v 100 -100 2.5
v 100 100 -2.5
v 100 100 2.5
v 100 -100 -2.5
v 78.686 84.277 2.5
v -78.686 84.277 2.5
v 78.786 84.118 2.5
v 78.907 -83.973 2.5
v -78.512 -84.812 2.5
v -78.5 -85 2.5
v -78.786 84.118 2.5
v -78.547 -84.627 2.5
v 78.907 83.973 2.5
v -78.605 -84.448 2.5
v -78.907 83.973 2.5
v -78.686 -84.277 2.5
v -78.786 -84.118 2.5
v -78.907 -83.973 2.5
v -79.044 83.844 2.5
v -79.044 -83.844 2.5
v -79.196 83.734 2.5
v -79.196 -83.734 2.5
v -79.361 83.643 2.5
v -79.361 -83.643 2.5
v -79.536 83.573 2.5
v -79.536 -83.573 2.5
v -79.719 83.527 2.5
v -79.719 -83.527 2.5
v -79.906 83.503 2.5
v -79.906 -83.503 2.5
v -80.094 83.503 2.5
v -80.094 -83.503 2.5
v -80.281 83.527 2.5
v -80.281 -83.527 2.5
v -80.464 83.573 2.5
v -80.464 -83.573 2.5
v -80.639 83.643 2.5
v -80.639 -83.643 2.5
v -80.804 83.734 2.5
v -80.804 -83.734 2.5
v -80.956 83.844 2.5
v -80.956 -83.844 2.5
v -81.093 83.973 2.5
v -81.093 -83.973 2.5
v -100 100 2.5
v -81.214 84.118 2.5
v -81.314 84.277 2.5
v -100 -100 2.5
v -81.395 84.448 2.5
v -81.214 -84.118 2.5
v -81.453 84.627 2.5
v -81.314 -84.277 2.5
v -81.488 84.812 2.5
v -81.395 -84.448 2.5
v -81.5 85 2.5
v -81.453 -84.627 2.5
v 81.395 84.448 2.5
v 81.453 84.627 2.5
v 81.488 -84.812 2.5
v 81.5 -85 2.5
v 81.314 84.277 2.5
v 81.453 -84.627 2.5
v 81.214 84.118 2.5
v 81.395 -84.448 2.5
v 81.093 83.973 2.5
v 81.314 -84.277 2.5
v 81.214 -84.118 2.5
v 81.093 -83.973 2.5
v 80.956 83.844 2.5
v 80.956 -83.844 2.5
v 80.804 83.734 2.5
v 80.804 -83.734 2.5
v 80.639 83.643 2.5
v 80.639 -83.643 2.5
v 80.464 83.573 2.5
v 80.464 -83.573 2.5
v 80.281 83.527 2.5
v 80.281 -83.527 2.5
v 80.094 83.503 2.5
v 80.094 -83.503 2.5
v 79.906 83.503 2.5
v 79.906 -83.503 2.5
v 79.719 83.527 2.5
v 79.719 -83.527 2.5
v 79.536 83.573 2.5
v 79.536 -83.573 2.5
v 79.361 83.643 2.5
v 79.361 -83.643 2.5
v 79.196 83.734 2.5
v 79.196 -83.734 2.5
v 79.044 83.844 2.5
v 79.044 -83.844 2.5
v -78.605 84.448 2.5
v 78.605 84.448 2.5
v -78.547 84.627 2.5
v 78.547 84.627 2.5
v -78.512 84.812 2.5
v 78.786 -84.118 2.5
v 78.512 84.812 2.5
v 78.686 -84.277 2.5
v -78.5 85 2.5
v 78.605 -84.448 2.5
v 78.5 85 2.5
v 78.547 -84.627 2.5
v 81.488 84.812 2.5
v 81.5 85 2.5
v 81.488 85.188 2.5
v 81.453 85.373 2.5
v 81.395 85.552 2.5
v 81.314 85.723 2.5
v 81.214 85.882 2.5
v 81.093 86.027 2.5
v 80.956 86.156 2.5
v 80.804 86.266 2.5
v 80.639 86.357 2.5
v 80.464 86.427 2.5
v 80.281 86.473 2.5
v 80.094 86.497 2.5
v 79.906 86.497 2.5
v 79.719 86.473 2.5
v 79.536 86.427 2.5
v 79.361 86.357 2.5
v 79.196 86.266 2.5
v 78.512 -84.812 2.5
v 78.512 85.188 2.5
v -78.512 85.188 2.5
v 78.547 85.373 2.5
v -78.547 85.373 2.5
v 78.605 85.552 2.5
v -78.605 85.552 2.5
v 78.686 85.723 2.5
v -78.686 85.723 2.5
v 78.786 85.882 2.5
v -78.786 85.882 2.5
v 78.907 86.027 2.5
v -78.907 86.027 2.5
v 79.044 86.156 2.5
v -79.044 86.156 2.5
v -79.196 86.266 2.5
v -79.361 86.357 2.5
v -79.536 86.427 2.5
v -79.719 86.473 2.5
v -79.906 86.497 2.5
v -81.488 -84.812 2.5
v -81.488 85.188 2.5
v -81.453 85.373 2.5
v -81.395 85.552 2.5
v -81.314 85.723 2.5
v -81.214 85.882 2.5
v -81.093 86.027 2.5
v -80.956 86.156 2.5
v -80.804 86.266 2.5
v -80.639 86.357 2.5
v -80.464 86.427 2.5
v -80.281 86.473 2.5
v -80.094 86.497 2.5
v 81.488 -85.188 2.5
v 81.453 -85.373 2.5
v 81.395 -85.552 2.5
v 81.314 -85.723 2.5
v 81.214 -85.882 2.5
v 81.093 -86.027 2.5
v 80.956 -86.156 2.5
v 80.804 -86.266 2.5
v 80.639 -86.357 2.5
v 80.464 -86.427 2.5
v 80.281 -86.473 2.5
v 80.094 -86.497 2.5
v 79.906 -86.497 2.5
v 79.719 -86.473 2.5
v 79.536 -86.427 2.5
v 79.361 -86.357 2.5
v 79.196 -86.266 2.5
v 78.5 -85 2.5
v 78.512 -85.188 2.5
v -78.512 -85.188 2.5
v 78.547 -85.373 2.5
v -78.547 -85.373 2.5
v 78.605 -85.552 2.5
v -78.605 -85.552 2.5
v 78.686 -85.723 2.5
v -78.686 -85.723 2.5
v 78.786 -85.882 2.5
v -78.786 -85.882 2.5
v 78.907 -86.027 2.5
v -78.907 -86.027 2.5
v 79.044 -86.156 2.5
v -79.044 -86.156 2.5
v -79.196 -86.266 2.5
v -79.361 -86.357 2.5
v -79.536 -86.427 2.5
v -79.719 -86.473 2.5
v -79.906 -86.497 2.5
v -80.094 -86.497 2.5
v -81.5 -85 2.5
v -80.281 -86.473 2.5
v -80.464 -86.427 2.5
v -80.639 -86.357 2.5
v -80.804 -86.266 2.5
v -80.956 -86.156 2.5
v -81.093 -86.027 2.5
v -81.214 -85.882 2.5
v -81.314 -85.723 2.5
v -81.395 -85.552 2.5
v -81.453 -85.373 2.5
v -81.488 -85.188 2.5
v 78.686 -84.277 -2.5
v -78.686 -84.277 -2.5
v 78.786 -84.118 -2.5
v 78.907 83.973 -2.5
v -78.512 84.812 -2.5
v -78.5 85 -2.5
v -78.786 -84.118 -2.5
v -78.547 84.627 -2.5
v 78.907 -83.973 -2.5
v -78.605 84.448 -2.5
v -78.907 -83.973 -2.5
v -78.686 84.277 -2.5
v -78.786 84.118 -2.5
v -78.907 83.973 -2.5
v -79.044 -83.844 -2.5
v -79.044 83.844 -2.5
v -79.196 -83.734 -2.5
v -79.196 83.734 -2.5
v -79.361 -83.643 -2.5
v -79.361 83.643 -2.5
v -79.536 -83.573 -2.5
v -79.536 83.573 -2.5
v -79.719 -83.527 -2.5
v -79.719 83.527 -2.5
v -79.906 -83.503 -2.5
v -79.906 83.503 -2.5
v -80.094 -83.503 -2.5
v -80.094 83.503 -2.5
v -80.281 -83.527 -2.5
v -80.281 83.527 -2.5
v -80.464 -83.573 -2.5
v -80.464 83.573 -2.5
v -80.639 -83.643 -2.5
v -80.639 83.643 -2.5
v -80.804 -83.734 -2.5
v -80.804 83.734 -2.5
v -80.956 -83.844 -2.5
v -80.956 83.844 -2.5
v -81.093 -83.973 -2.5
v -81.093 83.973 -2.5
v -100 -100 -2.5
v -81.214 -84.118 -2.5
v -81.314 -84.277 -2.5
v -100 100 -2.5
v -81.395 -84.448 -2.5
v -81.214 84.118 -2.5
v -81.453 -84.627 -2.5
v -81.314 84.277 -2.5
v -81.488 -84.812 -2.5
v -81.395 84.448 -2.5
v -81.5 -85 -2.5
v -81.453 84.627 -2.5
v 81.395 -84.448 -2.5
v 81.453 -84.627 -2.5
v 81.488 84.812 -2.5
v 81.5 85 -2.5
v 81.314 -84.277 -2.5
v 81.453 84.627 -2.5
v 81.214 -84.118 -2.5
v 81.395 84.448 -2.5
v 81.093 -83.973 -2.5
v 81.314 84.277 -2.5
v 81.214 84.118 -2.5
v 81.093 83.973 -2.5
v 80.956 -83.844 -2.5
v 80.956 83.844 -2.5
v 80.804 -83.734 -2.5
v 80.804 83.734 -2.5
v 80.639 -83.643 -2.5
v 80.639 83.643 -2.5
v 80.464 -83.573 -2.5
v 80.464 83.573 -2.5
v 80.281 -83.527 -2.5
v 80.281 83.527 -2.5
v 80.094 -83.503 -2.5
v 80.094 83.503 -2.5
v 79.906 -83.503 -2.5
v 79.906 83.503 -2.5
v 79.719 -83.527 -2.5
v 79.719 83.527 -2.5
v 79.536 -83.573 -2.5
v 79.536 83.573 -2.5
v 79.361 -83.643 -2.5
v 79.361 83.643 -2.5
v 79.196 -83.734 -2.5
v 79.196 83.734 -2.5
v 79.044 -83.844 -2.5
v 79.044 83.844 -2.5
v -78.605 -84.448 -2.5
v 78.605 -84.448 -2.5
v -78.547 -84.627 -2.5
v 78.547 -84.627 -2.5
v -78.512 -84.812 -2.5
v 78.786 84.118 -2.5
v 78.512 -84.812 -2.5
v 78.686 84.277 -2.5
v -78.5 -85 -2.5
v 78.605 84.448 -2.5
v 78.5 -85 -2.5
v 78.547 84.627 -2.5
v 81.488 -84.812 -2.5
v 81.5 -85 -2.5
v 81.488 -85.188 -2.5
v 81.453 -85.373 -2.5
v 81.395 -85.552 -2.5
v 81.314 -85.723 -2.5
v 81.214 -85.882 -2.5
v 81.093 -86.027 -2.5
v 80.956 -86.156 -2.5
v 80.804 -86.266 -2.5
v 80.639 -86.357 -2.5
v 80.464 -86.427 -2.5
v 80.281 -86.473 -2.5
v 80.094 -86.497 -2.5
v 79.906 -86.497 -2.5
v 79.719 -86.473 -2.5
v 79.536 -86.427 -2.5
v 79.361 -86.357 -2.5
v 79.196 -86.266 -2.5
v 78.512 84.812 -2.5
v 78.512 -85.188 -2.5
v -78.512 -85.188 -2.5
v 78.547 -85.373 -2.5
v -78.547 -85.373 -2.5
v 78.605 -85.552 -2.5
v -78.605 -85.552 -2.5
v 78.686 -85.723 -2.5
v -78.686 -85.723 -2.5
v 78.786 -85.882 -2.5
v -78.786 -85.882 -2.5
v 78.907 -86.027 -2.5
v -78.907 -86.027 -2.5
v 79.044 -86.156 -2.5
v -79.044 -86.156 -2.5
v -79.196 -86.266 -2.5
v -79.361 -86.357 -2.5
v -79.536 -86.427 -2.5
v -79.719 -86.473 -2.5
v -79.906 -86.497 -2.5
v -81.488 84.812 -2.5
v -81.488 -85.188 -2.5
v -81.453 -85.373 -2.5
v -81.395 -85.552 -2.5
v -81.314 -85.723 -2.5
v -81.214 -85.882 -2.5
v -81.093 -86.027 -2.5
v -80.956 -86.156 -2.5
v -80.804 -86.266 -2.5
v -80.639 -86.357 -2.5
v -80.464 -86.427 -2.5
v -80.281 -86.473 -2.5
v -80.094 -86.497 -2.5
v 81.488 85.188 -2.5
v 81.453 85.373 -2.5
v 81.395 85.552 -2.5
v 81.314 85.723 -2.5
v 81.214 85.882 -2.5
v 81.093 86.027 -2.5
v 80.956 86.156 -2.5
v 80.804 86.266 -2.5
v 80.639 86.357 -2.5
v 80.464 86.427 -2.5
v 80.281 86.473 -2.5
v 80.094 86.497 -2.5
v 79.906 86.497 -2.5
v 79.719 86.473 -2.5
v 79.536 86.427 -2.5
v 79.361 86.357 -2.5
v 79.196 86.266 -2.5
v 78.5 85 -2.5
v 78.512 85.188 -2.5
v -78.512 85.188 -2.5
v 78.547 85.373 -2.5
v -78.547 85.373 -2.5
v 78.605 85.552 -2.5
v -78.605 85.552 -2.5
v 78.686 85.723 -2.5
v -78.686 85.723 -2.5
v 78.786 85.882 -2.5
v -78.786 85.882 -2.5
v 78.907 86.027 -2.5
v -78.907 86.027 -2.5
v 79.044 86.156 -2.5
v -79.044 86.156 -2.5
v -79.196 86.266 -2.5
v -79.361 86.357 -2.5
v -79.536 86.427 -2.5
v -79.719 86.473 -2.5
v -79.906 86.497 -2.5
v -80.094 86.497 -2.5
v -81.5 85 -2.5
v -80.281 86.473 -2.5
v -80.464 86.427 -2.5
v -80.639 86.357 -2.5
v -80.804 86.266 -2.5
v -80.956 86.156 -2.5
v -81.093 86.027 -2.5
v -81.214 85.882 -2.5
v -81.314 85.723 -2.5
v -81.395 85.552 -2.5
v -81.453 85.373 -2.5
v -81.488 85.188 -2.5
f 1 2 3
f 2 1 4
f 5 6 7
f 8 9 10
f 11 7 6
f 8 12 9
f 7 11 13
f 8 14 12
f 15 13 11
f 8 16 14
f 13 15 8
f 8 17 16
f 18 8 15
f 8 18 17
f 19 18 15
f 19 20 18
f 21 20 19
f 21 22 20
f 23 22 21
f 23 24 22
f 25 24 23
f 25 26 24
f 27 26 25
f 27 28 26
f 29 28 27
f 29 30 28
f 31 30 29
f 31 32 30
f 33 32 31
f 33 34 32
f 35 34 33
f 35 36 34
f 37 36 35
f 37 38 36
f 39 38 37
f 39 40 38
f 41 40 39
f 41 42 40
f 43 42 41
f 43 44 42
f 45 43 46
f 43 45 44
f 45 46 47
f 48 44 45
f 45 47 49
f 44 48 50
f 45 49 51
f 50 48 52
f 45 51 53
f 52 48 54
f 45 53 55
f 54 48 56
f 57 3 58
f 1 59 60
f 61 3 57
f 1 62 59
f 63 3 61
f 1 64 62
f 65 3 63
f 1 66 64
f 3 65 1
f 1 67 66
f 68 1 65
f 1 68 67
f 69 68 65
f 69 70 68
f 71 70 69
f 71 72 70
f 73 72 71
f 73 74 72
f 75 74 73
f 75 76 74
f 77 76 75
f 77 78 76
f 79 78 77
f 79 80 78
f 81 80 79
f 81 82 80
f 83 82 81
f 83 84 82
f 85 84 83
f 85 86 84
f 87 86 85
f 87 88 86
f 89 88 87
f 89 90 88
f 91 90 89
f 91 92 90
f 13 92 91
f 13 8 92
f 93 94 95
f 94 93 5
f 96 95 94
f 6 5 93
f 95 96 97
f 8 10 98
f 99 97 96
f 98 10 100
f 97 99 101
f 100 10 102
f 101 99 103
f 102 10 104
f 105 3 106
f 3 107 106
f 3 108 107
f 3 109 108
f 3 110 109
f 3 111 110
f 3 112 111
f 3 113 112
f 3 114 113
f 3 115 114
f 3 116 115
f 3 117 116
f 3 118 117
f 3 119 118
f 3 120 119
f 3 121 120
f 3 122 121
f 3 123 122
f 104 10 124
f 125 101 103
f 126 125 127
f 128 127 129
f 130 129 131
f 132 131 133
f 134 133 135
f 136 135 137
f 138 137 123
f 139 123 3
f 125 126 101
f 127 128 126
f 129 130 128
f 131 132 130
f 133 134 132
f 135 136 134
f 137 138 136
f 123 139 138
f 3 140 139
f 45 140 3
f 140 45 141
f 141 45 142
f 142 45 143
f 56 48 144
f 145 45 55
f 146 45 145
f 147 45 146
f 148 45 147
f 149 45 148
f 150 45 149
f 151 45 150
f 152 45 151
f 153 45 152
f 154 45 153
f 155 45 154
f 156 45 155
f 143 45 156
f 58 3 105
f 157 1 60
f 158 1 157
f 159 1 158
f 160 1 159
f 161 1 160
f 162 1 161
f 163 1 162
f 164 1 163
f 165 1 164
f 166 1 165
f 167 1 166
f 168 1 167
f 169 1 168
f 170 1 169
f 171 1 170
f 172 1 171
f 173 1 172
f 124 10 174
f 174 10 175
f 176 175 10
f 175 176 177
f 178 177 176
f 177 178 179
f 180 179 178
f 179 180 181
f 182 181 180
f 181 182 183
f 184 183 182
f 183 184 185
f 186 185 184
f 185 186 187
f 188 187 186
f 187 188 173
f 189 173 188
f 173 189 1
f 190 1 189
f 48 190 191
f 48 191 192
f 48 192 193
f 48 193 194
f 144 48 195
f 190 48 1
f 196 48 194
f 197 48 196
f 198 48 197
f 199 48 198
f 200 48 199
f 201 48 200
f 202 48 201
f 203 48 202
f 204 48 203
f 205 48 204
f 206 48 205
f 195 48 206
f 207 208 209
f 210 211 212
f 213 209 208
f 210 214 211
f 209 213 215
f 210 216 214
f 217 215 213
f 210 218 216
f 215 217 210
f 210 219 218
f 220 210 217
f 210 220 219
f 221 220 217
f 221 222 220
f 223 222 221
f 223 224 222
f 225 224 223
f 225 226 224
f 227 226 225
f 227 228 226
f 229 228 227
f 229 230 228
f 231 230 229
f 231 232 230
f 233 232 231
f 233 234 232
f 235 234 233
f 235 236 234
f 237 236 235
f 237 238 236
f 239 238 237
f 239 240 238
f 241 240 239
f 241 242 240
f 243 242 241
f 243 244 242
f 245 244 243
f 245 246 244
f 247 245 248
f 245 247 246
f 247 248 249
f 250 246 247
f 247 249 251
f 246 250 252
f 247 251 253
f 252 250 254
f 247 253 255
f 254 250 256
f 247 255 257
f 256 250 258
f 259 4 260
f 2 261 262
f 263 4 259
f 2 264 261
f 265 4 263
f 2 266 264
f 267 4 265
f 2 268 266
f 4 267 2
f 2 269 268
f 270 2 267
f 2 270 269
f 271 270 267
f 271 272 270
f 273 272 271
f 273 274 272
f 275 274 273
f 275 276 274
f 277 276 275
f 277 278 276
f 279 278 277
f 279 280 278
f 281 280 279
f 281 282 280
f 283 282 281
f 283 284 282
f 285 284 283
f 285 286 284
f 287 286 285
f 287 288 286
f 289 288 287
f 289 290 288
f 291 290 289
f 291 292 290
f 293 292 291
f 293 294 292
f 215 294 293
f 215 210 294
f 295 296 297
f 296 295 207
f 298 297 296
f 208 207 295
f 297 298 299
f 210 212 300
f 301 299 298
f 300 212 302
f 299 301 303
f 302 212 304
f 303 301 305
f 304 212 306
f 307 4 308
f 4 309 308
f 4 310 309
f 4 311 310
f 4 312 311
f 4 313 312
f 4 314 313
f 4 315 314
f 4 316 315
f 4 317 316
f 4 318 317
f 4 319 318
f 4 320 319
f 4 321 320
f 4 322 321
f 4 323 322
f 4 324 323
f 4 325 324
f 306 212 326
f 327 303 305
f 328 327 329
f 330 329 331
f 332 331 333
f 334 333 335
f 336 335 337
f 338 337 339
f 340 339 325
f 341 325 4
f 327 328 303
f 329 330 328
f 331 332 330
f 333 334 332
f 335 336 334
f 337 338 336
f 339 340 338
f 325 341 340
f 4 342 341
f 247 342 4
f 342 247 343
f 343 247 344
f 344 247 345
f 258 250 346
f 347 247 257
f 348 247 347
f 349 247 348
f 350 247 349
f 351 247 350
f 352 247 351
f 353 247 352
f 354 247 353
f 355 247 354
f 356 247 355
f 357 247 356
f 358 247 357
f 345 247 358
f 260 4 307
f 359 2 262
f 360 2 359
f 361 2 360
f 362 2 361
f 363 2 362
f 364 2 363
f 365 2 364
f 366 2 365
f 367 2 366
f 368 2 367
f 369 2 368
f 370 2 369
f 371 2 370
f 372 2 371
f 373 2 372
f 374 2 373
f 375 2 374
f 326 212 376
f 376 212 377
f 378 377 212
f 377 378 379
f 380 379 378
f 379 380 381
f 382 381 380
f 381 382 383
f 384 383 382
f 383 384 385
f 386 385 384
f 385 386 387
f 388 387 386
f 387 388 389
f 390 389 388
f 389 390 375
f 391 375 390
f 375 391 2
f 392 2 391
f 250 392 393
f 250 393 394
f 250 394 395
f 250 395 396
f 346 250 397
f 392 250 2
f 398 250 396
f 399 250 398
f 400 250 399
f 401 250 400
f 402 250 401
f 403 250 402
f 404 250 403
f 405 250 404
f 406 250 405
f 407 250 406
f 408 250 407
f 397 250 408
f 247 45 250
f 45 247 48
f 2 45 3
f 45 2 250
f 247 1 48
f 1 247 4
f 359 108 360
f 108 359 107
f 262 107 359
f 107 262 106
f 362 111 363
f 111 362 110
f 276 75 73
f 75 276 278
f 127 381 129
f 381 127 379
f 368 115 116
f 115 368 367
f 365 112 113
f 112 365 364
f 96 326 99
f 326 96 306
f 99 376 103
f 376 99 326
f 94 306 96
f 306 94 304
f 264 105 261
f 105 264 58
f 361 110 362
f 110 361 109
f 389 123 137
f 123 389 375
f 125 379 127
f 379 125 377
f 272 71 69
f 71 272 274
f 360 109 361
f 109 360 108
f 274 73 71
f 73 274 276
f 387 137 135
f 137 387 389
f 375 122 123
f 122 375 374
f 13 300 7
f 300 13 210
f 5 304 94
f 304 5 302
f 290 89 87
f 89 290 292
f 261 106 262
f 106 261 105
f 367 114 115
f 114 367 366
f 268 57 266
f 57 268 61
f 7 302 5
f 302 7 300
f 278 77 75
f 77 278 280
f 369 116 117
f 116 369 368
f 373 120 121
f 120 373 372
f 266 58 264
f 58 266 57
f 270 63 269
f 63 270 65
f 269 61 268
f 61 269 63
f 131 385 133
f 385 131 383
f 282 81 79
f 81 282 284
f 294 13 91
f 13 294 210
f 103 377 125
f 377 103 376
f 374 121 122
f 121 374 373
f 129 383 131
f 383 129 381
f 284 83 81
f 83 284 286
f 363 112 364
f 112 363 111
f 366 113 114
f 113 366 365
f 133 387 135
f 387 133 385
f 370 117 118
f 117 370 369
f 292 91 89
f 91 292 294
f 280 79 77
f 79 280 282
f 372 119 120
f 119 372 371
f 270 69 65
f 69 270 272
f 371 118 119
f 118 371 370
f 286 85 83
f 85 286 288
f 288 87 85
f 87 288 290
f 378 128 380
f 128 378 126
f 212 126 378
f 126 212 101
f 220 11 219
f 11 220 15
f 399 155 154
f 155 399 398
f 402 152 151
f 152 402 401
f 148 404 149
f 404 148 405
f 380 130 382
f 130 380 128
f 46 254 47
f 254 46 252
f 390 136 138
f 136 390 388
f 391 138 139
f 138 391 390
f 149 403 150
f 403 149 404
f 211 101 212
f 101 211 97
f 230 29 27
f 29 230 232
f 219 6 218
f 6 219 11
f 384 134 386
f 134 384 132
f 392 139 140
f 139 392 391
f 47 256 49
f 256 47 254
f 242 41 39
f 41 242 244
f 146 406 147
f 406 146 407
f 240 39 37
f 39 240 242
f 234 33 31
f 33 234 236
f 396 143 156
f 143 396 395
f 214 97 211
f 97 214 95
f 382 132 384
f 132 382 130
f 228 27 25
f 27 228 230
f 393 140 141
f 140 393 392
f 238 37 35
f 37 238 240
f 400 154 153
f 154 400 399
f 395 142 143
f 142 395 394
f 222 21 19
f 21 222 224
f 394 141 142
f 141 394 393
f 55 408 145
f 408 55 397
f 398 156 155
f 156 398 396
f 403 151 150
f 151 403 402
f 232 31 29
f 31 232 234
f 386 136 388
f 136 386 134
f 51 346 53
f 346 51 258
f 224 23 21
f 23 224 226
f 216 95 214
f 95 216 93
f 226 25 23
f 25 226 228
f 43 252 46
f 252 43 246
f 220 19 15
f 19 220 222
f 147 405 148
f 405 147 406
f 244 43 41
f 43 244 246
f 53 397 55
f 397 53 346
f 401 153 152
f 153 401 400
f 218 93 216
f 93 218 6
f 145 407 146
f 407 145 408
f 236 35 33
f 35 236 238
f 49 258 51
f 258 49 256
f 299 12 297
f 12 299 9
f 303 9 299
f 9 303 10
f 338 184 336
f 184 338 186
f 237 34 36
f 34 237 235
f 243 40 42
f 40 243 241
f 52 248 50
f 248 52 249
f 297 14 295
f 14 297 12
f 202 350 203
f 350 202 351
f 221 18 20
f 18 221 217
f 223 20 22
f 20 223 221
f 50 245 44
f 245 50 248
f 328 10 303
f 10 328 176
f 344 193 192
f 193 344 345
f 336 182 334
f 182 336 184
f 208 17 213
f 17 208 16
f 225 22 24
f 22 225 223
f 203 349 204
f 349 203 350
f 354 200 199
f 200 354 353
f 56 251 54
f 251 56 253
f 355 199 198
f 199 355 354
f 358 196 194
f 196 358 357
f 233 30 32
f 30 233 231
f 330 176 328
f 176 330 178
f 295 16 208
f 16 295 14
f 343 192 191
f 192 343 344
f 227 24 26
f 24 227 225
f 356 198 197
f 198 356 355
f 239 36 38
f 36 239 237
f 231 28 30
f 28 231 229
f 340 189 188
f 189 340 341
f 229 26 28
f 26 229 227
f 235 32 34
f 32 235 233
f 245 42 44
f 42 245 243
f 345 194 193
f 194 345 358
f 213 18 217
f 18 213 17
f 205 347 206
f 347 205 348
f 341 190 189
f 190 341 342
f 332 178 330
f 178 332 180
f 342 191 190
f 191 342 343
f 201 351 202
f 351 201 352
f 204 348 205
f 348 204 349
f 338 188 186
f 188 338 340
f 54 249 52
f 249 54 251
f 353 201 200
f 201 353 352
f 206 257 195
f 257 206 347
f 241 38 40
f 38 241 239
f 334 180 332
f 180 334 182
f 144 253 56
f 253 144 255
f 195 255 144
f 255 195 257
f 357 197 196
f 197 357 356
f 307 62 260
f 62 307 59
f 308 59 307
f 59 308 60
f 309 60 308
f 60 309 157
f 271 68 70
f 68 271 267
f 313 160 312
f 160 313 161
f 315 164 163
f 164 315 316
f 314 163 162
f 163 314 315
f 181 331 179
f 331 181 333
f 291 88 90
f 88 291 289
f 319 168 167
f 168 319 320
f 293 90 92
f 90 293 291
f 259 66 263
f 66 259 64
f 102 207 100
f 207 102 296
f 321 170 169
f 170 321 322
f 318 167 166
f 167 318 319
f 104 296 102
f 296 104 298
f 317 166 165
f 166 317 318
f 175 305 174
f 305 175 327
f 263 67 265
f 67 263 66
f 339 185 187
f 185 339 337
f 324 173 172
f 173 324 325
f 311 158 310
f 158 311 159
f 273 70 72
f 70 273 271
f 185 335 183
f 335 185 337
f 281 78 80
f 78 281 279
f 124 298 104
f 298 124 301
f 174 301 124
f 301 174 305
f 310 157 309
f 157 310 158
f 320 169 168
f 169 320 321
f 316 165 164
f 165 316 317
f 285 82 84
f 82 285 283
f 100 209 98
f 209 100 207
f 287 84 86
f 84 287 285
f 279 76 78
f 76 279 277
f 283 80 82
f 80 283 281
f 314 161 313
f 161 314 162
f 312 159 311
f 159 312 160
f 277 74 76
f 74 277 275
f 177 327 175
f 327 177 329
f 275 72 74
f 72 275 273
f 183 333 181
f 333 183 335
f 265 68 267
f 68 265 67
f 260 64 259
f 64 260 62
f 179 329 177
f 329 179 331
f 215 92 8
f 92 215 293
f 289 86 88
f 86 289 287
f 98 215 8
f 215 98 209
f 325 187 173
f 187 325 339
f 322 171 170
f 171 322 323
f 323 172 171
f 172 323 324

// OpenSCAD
//Author: Piotr Paterek, Kraków 05-08.2016
$fn=50;
module base()
{
    difference()
    {
    difference()
    {
        difference()
        {
            difference()
            {
            cube([200,200,5], center=true); 
            translate([80,85,0])
                {
                    cylinder(r=1.5, h=10, center=true);
                }
            }
         translate([-80,85,0])
                {
                    cylinder(r=1.5, h=10, center=true);
            }
        }
   translate([-80,-85,0])
                {
                    cylinder(r=1.5, h=10, center=true); 
                }
   }
   translate([80,-85,0])
                {
                    cylinder(r=1.5, h=10, center=true);
                }
            }
 }
    
 base();
